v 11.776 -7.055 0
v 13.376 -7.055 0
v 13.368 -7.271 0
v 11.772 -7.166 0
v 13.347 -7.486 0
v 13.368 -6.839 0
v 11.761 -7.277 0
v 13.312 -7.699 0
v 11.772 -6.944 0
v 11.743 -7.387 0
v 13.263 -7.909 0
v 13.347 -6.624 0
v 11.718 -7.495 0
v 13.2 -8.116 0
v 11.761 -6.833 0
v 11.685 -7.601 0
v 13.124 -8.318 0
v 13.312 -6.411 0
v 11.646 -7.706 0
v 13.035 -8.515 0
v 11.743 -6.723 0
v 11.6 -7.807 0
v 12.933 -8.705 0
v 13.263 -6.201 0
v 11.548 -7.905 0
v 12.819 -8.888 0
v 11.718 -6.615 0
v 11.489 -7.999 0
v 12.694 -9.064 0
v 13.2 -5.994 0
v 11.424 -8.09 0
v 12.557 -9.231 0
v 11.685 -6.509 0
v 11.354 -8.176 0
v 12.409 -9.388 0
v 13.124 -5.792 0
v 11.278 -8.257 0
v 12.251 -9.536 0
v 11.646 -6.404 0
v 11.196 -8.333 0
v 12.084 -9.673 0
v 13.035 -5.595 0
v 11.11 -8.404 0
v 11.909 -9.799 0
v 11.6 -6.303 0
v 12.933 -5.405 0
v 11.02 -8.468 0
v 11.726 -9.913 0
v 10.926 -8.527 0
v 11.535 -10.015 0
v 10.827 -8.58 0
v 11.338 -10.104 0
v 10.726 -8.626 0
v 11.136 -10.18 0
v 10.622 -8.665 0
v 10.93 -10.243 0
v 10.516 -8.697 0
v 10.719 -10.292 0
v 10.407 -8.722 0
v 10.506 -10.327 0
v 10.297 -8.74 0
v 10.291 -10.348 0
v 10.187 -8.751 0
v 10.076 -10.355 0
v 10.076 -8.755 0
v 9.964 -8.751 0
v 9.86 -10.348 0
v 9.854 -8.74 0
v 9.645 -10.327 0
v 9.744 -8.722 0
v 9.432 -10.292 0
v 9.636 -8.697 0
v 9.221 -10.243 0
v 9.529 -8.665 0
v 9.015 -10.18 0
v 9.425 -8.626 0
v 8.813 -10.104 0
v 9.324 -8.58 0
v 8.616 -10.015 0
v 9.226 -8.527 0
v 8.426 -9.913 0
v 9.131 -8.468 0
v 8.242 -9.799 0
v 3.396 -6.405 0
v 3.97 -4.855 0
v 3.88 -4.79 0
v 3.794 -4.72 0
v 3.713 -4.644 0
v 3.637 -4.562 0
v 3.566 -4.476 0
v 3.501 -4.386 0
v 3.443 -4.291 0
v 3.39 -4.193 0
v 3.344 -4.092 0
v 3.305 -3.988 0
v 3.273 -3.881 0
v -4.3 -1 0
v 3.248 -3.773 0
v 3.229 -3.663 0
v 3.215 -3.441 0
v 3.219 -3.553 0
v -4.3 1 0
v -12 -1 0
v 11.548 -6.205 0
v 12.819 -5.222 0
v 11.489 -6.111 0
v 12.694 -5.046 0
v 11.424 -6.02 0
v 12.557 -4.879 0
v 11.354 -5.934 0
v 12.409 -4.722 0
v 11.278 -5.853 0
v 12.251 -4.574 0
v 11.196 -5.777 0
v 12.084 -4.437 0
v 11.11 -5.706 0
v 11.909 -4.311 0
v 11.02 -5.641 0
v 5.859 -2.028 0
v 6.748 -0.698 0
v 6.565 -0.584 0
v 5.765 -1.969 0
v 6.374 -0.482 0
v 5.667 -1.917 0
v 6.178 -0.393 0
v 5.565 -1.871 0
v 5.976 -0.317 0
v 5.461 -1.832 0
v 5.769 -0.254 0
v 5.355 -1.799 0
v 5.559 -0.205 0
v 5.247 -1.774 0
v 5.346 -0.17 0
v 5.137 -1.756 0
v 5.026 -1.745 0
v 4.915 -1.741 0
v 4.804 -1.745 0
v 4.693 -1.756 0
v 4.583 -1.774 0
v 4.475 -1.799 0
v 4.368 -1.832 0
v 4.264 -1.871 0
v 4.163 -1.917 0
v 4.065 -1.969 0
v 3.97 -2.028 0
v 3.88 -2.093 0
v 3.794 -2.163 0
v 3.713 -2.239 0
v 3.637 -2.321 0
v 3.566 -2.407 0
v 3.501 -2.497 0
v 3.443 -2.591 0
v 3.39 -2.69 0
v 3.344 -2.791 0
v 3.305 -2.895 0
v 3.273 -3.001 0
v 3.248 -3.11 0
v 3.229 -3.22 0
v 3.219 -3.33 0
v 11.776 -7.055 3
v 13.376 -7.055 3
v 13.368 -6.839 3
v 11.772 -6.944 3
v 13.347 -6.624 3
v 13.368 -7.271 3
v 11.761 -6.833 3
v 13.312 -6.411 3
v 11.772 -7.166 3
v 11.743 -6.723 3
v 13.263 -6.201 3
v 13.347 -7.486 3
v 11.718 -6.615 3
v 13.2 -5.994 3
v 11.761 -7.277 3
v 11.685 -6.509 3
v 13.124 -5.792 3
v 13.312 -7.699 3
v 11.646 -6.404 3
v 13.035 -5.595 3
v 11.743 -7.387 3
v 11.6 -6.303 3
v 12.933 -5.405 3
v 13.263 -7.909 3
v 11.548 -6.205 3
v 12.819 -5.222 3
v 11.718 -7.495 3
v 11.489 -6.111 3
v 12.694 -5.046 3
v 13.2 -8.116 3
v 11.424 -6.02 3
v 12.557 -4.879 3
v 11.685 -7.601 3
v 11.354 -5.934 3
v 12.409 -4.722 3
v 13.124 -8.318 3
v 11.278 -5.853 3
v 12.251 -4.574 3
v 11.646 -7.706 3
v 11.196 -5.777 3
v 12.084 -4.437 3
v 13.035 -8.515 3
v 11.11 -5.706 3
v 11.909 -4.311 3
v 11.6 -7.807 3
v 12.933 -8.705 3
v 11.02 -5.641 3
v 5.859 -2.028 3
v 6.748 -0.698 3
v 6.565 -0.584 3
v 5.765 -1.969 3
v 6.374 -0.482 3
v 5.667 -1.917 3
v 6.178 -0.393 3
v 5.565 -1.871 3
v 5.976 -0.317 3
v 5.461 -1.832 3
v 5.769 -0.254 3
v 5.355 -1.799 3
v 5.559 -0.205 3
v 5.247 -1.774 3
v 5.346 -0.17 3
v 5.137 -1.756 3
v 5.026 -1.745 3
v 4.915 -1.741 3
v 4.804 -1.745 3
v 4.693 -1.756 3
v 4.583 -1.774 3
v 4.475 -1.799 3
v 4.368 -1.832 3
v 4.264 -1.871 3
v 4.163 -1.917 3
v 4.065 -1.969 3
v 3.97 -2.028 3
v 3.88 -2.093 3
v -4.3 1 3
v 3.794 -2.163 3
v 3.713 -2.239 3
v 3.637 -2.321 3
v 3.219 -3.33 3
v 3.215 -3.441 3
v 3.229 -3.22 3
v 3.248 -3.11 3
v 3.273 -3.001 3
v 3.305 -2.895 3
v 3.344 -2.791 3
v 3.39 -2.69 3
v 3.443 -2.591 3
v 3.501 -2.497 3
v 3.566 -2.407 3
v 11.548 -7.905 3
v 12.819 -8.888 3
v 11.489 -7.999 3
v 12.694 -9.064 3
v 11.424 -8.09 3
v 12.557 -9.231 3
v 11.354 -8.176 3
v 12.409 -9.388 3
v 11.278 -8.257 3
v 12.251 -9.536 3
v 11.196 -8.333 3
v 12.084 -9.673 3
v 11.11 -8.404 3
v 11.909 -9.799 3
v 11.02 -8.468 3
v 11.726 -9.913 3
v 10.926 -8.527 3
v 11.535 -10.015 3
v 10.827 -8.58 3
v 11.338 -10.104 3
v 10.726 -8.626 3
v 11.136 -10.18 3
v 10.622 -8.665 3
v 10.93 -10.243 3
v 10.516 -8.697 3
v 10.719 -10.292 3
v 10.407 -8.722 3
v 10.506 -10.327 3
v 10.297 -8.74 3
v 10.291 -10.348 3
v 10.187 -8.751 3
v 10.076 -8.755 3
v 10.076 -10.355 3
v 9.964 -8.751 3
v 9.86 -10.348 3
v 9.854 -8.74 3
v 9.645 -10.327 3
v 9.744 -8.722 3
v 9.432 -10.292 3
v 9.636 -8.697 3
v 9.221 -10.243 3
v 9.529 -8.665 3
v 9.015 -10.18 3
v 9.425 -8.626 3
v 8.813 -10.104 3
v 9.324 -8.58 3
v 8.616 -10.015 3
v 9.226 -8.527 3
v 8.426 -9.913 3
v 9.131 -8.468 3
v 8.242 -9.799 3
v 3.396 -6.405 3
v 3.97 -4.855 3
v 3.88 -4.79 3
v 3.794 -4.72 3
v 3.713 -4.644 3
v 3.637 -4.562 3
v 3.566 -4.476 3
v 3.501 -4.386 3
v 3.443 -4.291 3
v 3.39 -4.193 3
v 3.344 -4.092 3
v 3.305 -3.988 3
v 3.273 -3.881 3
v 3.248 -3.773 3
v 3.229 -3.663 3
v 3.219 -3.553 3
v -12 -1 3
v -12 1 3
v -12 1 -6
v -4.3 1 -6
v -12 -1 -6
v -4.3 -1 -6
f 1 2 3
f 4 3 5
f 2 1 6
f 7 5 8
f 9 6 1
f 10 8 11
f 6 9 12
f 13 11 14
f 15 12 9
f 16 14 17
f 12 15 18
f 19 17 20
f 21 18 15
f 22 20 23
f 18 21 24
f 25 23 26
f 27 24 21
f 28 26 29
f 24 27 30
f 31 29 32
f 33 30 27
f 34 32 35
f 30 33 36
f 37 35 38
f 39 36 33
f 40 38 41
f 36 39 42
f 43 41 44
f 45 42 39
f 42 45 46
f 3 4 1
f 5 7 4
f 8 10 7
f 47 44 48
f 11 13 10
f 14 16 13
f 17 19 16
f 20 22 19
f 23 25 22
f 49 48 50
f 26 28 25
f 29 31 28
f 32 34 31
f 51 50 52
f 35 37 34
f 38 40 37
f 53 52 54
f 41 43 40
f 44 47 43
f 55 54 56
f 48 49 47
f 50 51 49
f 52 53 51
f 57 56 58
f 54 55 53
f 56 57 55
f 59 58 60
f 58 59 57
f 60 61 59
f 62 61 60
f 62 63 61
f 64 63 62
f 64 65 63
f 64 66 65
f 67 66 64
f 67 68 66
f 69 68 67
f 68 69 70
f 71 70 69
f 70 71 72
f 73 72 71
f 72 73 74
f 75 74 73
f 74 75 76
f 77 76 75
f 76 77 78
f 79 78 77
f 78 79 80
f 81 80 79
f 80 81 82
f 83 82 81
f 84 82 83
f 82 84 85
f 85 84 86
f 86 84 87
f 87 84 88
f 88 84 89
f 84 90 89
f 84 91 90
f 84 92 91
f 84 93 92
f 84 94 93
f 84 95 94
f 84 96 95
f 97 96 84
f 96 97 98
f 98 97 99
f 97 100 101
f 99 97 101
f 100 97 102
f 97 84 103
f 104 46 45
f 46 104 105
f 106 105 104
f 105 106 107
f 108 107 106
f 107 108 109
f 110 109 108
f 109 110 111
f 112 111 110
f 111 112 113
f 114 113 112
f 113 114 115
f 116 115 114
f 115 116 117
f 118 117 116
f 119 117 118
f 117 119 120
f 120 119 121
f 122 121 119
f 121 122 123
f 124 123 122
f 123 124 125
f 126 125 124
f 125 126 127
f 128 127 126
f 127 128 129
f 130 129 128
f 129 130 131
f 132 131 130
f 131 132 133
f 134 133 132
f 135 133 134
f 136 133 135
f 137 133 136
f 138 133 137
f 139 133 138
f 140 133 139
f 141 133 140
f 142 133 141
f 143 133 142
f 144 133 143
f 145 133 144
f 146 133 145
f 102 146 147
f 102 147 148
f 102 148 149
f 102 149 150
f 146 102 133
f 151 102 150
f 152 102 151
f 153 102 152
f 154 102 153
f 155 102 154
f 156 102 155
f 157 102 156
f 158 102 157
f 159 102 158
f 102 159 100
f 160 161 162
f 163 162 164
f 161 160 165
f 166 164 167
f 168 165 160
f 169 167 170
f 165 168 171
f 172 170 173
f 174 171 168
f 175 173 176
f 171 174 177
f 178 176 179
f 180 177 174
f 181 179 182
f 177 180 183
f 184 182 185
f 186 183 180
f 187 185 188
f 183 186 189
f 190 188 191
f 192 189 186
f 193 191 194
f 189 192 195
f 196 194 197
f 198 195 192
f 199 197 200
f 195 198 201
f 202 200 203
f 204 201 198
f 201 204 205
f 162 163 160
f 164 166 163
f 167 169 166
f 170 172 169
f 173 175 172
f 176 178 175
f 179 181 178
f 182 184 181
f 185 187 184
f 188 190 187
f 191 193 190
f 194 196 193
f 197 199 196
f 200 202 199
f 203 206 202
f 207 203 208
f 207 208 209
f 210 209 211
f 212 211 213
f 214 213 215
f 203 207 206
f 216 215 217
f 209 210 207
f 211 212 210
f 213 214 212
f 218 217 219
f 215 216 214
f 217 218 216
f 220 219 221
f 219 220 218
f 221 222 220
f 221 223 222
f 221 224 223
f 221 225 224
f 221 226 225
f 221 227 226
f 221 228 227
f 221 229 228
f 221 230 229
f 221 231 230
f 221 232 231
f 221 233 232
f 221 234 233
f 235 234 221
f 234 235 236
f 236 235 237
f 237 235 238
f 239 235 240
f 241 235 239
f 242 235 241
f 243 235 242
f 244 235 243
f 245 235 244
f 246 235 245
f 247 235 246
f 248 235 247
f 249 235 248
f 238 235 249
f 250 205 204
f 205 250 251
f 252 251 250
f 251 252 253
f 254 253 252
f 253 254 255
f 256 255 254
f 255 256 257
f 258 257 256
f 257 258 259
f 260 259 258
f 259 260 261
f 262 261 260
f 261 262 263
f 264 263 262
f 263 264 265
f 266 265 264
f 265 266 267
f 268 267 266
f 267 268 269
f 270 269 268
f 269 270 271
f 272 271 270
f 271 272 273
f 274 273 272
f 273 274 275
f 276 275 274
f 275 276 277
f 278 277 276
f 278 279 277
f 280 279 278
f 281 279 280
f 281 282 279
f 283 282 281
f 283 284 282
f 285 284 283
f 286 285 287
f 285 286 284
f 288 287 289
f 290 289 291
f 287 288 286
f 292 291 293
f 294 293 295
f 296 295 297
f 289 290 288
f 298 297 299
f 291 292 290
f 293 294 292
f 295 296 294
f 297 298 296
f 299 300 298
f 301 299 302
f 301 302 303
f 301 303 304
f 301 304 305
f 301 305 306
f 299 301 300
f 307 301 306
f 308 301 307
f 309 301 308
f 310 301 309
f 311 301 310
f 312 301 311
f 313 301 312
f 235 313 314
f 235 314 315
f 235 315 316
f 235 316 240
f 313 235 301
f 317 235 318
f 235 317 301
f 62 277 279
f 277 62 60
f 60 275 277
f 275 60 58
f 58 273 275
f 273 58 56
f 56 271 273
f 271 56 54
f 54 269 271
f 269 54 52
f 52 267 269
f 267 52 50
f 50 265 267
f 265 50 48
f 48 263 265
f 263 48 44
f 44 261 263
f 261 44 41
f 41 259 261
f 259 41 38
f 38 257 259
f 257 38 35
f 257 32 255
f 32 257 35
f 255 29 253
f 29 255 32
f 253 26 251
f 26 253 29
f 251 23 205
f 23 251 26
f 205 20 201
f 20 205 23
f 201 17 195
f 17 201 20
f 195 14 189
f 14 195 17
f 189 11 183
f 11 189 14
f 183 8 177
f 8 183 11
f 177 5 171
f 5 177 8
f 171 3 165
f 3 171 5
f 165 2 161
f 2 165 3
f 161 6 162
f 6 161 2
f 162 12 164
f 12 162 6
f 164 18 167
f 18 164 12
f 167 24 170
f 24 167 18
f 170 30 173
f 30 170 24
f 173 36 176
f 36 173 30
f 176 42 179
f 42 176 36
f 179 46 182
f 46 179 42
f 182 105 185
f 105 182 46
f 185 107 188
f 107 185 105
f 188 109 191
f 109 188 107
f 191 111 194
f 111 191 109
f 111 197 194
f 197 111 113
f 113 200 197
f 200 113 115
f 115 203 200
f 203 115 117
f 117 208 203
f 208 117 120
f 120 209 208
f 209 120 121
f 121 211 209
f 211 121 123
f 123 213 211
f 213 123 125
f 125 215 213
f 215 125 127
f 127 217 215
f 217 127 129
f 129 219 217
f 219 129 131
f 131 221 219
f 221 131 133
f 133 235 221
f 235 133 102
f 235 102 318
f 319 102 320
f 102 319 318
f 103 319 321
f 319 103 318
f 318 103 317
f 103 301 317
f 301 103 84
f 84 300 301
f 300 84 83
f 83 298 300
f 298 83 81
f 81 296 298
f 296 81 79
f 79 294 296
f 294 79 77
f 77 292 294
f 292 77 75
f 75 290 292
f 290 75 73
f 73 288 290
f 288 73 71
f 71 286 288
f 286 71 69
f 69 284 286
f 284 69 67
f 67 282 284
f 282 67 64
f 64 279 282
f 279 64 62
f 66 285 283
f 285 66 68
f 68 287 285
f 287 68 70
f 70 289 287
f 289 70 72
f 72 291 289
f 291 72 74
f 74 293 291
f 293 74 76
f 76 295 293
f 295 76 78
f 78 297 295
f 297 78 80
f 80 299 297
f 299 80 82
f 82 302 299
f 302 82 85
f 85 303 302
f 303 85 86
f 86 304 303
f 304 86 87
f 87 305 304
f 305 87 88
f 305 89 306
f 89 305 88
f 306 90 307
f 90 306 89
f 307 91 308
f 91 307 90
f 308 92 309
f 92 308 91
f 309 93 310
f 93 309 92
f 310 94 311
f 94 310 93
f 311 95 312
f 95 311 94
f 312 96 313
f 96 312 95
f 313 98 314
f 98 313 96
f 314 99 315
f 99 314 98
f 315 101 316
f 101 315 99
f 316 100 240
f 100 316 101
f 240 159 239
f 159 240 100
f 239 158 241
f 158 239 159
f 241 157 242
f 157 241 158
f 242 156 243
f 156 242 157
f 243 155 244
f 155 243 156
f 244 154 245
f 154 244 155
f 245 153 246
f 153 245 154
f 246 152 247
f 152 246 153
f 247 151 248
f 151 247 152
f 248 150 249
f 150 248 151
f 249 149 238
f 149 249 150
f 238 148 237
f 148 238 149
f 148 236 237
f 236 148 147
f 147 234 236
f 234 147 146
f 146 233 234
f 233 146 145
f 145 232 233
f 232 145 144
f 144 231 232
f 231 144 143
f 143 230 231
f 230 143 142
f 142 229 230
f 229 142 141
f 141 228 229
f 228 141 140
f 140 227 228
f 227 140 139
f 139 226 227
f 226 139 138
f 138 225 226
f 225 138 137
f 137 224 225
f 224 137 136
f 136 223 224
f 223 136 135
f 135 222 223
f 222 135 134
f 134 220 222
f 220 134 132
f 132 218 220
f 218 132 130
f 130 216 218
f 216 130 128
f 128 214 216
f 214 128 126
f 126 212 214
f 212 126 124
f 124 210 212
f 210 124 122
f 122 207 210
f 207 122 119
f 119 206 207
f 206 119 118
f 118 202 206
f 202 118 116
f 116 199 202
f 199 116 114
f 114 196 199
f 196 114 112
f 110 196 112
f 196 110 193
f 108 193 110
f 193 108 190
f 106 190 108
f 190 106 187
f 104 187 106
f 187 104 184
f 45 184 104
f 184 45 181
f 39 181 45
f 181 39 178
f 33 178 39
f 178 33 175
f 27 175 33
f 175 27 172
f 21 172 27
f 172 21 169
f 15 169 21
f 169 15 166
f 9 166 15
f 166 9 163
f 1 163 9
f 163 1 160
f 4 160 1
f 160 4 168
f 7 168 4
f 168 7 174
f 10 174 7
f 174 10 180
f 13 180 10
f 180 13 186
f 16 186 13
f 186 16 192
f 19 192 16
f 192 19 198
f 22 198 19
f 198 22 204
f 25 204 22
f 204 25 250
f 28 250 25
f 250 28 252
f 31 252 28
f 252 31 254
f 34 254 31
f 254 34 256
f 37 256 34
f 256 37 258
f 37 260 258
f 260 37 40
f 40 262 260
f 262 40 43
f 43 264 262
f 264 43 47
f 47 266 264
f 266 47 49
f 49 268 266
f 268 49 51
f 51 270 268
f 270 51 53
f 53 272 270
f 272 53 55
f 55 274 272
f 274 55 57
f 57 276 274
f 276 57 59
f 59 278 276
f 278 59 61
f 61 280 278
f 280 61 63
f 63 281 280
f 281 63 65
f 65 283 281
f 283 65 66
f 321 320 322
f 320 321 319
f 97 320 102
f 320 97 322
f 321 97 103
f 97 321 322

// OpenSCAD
// Zelo+ — Acionamento da tampa do compartimento (impressao 3D)
// Pecas: alavanca da tampa, braco do servo e pino com argola.
// Abra no OpenSCAD, escolha a peca em PECA e exporte o STL (F6, depois F7).
//
// Montagem (corte lateral; Y para tras e Z para cima, em mm a partir da frente e da base):
//   eixo da dobradica da tampa ........ Y 94,5  Z 96   (13,8 mm atras da divisoria)
//   eixo do servo SG90 ................. Y 98,5  Z 70   (eixo paralelo ao da dobradica)
//   face de baixo da tampa ............. Z 97   (1 mm acima do eixo)
//   furo do pino no braco do servo ..... a 20 mm do eixo do servo
//   rasgo da alavanca .................. de 6,0 a 12,3 mm do eixo da dobradica, a -35 graus
//   curso do servo ..................... 47 graus para a tampa ir de 0 a 90 graus

PECA = "alavanca";   // "alavanca", "braco" ou "pino"

PHI0 = -35;            // angulo da alavanca com a tampa fechada
R_BRACO = 20;          // raio do furo do pino no braco do servo
RASGO_INI = 6.0;
RASGO_FIM = 12.3;
FURO = 3.4;            // folga para o pino de 3,0 mm
PAREDE = 1.6;
ESP_ALAVANCA = 3.0;
ESP_BRACO = 3.2;
PINO_D = 3.0;
FACE = 1.0;            // face de baixo da tampa em relacao ao eixo da dobradica
SAPATA_FIM = -4.3;     // a sapata termina antes do barril da dobradica (raio 4)
// braco simples original do SG90 (encaixe)
HORN_L = 15.5;  HORN_CUBO = 3.8;  HORN_PONTA = 2.3;

$fn = 96;
u = [cos(PHI0), sin(PHI0)];
function ao_longo(r) = r * u;
rb = FURO / 2 + PAREDE;

module bossa()  { hull() { translate(ao_longo(RASGO_INI)) circle(rb); translate(ao_longo(RASGO_FIM)) circle(rb); } }
module rasgo()  { hull() { translate(ao_longo(RASGO_INI)) circle(FURO / 2); translate(ao_longo(RASGO_FIM)) circle(FURO / 2); } }
module sapata() { translate([-12, FACE - 2]) square([SAPATA_FIM + 12, 2]); }   // face de colagem = face de baixo da tampa

module alavanca() {
  linear_extrude(ESP_ALAVANCA)
    difference() {
      intersection() {
        union() { sapata(); hull() { sapata(); translate(ao_longo(RASGO_INI)) circle(rb); } bossa(); }
        translate([-20, -30]) square([50, 30 + FACE]);     // nada acima da face de baixo da tampa
      }
      rasgo();
    }
  translate([0, 0, -6]) linear_extrude(9) sapata();           // sapata de 9 mm para a cola
}

module braco() {
  difference() {
    linear_extrude(ESP_BRACO) hull() { circle(6); translate([R_BRACO, 0]) circle(4); }
    translate([0, 0, -1]) cylinder(h = ESP_BRACO + 2, r = 2.9);              // acesso ao parafuso central
    translate([R_BRACO, 0, -1]) cylinder(h = ESP_BRACO + 2, d = FURO);       // furo do pino
    translate([0, 0, ESP_BRACO - 1.6]) linear_extrude(2)                     // encaixe do braco original
      hull() { circle(HORN_CUBO + 0.2); translate([HORN_L, 0]) circle(HORN_PONTA + 0.2); }
    for (r = [8, 12]) translate([r, 0, -1]) cylinder(h = ESP_BRACO + 2, r = 0.65);  // parafusos M2
  }
}

module pino() {
  L = ESP_ALAVANCA + 0.5 + ESP_BRACO + 2.6;   // alavanca + folga + braco + trava
  ez = PINO_D / 2 - 0.3;                       // base plana de 0,3 mm na mesa
  intersection() {
    union() {
      difference() {
        union() {
          translate([0, 0, ez]) rotate([0, 90, 0]) cylinder(h = L, d = PINO_D);
          translate([L - 1.2, 0, ez]) rotate([0, 90, 0]) cylinder(h = 1.2, r1 = PINO_D / 2 + 0.35, r2 = PINO_D / 2 - 0.4);
        }
        translate([L - 4.2, -0.4, -2]) cube([4.3, 0.8, 10]);   // fenda: as metades flexionam ao encaixar
      }
      translate([-1, 0, ez]) rotate([0, 90, 0]) cylinder(h = 1, r = PINO_D / 2 + 1);
      translate([-1 - 6 + 0.6, 0, 0]) linear_extrude(2.4) difference() { circle(6); circle(3.6); }
    }
    translate([-50, -50, 0]) cube([100, 100, 50]);
  }
}

if (PECA == "alavanca") alavanca();
if (PECA == "braco") braco();
if (PECA == "pino") pino();
